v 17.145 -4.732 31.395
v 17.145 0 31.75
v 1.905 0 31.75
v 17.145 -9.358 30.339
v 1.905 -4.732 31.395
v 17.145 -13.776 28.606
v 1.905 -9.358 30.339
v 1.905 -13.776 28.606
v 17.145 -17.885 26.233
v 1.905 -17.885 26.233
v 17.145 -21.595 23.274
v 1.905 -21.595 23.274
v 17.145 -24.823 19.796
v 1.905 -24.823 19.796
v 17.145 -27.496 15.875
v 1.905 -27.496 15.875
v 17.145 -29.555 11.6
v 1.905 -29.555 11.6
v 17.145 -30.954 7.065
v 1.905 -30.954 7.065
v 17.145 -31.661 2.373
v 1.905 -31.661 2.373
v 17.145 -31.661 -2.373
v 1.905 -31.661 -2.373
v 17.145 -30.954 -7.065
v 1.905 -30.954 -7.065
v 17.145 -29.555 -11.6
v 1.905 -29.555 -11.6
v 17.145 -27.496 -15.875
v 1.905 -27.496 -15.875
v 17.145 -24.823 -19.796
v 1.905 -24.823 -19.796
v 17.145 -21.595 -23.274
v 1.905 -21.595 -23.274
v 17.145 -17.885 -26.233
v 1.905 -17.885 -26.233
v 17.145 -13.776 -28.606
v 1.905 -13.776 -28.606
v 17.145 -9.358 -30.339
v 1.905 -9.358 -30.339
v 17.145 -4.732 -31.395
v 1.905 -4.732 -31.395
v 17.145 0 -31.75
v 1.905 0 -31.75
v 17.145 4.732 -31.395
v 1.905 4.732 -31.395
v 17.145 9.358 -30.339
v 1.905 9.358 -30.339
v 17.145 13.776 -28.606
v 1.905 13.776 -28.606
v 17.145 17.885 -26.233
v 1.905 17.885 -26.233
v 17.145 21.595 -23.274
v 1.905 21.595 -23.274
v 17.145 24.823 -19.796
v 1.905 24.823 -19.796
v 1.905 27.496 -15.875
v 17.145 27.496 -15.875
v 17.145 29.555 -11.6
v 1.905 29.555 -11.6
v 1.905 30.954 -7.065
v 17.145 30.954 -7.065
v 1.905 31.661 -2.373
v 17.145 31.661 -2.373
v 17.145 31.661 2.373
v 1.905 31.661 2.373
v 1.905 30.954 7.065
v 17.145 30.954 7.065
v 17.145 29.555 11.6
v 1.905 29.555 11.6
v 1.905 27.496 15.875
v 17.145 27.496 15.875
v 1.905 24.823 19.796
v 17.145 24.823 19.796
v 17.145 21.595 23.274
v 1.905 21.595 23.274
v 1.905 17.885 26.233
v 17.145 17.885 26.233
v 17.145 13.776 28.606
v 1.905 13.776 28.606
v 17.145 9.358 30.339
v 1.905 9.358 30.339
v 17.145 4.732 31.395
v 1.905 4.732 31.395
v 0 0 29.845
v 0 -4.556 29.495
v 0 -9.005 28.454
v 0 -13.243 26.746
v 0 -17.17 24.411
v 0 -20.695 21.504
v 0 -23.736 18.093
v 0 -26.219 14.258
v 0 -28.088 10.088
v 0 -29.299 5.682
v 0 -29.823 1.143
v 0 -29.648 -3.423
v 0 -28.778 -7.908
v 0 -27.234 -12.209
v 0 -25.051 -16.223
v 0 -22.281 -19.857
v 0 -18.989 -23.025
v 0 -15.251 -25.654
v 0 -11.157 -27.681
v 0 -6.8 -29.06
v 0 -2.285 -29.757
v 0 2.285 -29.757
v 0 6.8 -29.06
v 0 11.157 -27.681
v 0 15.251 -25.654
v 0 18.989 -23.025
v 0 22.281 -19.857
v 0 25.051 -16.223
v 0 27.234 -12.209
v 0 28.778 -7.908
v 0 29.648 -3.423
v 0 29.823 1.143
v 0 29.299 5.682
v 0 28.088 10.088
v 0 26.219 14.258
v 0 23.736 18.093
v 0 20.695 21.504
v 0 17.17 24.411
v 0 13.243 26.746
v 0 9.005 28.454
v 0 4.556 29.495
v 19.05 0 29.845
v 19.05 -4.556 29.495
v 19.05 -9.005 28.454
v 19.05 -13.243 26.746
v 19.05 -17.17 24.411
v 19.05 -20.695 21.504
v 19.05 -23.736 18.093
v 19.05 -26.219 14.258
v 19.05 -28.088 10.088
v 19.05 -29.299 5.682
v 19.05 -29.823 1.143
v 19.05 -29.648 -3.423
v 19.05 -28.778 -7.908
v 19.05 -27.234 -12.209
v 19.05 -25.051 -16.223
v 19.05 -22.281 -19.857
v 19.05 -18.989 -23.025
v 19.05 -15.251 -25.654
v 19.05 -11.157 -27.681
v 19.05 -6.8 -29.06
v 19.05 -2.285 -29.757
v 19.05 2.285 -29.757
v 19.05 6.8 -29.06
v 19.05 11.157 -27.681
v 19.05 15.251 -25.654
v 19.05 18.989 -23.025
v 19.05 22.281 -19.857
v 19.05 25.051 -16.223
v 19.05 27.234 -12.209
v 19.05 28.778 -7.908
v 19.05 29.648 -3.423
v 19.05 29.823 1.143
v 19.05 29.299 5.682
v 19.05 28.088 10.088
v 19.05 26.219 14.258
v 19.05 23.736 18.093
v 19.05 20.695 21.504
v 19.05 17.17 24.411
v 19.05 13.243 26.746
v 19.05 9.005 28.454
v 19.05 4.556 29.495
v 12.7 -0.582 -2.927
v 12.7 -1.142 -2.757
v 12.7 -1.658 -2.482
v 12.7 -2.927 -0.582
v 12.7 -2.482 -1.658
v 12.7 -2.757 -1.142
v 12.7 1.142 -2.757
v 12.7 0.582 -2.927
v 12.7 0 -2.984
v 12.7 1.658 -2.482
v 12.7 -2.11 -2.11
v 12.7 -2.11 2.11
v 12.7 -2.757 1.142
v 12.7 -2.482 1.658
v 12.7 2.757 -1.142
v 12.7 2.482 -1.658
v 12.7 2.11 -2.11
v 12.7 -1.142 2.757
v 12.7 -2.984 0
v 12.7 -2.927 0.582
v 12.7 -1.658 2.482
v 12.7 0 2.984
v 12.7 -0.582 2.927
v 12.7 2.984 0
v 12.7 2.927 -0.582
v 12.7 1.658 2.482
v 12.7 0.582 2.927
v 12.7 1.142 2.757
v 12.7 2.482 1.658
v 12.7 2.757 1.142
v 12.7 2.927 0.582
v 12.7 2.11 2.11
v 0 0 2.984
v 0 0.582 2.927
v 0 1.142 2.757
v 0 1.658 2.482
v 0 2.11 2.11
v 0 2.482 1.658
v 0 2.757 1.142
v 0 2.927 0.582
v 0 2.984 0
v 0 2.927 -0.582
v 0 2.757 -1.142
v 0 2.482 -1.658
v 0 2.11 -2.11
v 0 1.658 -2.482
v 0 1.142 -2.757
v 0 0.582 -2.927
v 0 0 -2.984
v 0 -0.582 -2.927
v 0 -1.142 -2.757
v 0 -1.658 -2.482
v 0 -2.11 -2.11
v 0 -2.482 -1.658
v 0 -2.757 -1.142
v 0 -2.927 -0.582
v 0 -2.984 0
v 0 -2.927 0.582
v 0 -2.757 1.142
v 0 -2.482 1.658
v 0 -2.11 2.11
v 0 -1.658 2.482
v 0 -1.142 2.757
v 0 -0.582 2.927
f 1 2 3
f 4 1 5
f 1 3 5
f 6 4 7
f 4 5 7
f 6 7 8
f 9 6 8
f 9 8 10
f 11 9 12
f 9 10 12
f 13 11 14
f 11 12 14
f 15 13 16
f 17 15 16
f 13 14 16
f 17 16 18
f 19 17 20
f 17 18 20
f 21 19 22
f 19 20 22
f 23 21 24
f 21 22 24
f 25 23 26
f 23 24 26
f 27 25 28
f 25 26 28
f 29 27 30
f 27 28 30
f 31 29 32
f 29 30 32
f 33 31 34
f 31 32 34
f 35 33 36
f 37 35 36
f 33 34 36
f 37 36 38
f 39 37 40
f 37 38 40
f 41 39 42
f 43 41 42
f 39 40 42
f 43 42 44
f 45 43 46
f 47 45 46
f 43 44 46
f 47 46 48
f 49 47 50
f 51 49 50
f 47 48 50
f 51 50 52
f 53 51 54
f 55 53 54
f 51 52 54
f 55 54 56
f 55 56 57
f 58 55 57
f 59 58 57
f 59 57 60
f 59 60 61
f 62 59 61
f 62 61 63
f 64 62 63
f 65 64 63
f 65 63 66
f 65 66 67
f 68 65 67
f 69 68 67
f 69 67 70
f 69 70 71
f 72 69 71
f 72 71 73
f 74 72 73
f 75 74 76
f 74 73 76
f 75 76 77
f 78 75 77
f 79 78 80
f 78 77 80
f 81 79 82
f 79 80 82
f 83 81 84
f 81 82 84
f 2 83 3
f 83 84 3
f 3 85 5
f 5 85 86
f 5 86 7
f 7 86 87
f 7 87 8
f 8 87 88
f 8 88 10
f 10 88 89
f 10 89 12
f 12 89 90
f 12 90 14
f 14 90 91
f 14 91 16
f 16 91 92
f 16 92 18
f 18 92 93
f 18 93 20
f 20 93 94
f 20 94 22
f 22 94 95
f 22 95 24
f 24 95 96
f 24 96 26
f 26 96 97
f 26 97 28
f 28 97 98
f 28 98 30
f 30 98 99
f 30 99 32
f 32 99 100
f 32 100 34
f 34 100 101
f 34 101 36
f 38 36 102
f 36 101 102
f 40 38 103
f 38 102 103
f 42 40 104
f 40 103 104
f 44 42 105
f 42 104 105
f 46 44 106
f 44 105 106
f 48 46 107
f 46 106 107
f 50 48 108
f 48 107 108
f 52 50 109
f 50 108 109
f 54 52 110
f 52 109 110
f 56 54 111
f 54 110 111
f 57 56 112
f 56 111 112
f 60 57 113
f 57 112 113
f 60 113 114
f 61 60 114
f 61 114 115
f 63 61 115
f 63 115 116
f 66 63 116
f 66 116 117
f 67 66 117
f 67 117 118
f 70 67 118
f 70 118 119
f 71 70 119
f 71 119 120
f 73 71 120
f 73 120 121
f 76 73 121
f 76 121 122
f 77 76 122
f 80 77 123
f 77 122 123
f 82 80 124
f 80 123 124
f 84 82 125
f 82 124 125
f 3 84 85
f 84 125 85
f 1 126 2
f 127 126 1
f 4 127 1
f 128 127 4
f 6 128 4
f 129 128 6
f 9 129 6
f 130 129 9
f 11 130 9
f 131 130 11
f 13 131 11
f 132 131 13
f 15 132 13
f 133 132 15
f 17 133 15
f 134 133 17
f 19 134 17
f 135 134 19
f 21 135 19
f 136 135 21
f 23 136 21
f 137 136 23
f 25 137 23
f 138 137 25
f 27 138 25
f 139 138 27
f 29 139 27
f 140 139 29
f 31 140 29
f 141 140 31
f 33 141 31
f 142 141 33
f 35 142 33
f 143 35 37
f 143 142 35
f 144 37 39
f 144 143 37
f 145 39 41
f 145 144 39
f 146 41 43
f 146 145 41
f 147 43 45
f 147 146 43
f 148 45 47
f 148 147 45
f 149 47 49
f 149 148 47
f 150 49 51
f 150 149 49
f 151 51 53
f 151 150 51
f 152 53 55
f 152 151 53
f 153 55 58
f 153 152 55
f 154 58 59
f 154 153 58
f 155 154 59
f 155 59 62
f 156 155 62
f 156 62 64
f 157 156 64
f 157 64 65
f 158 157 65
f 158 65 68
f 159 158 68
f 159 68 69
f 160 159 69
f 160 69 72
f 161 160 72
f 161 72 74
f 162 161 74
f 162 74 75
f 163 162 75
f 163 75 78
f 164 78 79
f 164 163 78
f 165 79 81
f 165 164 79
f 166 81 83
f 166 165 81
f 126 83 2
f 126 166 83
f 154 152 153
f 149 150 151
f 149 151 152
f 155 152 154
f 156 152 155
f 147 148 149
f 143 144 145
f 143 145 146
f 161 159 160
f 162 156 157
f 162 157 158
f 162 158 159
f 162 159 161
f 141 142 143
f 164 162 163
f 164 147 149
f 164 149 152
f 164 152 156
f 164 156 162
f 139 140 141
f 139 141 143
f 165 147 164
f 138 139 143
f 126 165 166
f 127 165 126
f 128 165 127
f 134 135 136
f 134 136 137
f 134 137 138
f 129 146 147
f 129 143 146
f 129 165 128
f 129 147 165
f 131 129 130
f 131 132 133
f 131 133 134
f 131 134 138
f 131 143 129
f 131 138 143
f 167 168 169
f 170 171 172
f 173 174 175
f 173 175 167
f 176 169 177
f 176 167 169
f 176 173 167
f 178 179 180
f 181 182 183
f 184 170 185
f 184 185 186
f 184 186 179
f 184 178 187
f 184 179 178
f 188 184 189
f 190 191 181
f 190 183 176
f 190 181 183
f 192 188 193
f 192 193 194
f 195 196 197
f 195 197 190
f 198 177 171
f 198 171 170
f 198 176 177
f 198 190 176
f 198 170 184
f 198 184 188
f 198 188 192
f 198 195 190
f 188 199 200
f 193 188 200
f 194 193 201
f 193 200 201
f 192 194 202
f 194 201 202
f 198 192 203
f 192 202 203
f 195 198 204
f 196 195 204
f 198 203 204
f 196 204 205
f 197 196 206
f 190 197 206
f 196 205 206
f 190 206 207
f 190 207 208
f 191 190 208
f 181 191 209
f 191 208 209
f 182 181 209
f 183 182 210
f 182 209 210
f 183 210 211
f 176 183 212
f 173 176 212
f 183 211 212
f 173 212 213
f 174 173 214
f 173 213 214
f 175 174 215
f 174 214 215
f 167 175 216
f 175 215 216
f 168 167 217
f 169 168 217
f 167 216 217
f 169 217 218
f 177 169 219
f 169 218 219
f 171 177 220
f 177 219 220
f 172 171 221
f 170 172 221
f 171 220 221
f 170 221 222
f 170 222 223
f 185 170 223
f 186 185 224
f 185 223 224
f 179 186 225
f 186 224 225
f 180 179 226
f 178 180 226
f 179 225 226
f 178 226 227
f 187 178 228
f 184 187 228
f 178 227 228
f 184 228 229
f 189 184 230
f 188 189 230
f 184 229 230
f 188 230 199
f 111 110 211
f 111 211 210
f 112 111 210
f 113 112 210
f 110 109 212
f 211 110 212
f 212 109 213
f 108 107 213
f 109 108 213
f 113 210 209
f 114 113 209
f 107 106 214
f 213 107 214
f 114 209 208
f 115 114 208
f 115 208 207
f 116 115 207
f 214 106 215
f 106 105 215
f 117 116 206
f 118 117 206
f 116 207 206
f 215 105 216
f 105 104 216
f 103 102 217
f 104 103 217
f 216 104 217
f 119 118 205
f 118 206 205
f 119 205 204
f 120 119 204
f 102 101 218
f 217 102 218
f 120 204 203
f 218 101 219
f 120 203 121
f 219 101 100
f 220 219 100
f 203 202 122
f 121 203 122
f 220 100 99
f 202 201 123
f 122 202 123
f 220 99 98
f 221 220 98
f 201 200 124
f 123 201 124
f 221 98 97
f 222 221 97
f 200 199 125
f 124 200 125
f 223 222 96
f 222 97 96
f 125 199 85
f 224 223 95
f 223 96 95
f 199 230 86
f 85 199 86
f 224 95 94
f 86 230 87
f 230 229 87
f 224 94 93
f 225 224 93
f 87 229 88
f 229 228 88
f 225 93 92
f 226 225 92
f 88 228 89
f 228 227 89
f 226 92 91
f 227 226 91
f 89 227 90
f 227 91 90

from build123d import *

# Parameters (mm, degrees)
SKETCH1_R           = 31.75
BOSS_EXTRUDE1_DEPTH = 19.05
SKETCH2_R           = 2.9845
CUT_EXTRUDE1_DEPTH  = 12.7
CHAMFER1_SIZE       = 1.905


with BuildPart() as part:
    # Sketch1 → Boss-Extrude1 (new body)
    with BuildSketch(Plane(origin=(0, 0, 0), x_dir=(0, 0, -1), z_dir=(1, 0, 0))):
        with Locations(Location((0, 0, 0), (0, 0, 180))):
            Circle(SKETCH1_R)
    extrude(amount=BOSS_EXTRUDE1_DEPTH)

    # Sketch2 → Cut-Extrude1 (cut)
    with BuildSketch(Plane.ZY):
        Circle(SKETCH2_R)
    extrude(amount=-CUT_EXTRUDE1_DEPTH, mode=Mode.SUBTRACT)

    # Chamfer1
    chamfer1_edges = [part.edges().sort_by_distance(p)[0] for p in [
        (0, 0, -31.75),
        (19.05, 0, -31.75),
    ]]
    chamfer(chamfer1_edges, length=CHAMFER1_SIZE)


solid = part.part
